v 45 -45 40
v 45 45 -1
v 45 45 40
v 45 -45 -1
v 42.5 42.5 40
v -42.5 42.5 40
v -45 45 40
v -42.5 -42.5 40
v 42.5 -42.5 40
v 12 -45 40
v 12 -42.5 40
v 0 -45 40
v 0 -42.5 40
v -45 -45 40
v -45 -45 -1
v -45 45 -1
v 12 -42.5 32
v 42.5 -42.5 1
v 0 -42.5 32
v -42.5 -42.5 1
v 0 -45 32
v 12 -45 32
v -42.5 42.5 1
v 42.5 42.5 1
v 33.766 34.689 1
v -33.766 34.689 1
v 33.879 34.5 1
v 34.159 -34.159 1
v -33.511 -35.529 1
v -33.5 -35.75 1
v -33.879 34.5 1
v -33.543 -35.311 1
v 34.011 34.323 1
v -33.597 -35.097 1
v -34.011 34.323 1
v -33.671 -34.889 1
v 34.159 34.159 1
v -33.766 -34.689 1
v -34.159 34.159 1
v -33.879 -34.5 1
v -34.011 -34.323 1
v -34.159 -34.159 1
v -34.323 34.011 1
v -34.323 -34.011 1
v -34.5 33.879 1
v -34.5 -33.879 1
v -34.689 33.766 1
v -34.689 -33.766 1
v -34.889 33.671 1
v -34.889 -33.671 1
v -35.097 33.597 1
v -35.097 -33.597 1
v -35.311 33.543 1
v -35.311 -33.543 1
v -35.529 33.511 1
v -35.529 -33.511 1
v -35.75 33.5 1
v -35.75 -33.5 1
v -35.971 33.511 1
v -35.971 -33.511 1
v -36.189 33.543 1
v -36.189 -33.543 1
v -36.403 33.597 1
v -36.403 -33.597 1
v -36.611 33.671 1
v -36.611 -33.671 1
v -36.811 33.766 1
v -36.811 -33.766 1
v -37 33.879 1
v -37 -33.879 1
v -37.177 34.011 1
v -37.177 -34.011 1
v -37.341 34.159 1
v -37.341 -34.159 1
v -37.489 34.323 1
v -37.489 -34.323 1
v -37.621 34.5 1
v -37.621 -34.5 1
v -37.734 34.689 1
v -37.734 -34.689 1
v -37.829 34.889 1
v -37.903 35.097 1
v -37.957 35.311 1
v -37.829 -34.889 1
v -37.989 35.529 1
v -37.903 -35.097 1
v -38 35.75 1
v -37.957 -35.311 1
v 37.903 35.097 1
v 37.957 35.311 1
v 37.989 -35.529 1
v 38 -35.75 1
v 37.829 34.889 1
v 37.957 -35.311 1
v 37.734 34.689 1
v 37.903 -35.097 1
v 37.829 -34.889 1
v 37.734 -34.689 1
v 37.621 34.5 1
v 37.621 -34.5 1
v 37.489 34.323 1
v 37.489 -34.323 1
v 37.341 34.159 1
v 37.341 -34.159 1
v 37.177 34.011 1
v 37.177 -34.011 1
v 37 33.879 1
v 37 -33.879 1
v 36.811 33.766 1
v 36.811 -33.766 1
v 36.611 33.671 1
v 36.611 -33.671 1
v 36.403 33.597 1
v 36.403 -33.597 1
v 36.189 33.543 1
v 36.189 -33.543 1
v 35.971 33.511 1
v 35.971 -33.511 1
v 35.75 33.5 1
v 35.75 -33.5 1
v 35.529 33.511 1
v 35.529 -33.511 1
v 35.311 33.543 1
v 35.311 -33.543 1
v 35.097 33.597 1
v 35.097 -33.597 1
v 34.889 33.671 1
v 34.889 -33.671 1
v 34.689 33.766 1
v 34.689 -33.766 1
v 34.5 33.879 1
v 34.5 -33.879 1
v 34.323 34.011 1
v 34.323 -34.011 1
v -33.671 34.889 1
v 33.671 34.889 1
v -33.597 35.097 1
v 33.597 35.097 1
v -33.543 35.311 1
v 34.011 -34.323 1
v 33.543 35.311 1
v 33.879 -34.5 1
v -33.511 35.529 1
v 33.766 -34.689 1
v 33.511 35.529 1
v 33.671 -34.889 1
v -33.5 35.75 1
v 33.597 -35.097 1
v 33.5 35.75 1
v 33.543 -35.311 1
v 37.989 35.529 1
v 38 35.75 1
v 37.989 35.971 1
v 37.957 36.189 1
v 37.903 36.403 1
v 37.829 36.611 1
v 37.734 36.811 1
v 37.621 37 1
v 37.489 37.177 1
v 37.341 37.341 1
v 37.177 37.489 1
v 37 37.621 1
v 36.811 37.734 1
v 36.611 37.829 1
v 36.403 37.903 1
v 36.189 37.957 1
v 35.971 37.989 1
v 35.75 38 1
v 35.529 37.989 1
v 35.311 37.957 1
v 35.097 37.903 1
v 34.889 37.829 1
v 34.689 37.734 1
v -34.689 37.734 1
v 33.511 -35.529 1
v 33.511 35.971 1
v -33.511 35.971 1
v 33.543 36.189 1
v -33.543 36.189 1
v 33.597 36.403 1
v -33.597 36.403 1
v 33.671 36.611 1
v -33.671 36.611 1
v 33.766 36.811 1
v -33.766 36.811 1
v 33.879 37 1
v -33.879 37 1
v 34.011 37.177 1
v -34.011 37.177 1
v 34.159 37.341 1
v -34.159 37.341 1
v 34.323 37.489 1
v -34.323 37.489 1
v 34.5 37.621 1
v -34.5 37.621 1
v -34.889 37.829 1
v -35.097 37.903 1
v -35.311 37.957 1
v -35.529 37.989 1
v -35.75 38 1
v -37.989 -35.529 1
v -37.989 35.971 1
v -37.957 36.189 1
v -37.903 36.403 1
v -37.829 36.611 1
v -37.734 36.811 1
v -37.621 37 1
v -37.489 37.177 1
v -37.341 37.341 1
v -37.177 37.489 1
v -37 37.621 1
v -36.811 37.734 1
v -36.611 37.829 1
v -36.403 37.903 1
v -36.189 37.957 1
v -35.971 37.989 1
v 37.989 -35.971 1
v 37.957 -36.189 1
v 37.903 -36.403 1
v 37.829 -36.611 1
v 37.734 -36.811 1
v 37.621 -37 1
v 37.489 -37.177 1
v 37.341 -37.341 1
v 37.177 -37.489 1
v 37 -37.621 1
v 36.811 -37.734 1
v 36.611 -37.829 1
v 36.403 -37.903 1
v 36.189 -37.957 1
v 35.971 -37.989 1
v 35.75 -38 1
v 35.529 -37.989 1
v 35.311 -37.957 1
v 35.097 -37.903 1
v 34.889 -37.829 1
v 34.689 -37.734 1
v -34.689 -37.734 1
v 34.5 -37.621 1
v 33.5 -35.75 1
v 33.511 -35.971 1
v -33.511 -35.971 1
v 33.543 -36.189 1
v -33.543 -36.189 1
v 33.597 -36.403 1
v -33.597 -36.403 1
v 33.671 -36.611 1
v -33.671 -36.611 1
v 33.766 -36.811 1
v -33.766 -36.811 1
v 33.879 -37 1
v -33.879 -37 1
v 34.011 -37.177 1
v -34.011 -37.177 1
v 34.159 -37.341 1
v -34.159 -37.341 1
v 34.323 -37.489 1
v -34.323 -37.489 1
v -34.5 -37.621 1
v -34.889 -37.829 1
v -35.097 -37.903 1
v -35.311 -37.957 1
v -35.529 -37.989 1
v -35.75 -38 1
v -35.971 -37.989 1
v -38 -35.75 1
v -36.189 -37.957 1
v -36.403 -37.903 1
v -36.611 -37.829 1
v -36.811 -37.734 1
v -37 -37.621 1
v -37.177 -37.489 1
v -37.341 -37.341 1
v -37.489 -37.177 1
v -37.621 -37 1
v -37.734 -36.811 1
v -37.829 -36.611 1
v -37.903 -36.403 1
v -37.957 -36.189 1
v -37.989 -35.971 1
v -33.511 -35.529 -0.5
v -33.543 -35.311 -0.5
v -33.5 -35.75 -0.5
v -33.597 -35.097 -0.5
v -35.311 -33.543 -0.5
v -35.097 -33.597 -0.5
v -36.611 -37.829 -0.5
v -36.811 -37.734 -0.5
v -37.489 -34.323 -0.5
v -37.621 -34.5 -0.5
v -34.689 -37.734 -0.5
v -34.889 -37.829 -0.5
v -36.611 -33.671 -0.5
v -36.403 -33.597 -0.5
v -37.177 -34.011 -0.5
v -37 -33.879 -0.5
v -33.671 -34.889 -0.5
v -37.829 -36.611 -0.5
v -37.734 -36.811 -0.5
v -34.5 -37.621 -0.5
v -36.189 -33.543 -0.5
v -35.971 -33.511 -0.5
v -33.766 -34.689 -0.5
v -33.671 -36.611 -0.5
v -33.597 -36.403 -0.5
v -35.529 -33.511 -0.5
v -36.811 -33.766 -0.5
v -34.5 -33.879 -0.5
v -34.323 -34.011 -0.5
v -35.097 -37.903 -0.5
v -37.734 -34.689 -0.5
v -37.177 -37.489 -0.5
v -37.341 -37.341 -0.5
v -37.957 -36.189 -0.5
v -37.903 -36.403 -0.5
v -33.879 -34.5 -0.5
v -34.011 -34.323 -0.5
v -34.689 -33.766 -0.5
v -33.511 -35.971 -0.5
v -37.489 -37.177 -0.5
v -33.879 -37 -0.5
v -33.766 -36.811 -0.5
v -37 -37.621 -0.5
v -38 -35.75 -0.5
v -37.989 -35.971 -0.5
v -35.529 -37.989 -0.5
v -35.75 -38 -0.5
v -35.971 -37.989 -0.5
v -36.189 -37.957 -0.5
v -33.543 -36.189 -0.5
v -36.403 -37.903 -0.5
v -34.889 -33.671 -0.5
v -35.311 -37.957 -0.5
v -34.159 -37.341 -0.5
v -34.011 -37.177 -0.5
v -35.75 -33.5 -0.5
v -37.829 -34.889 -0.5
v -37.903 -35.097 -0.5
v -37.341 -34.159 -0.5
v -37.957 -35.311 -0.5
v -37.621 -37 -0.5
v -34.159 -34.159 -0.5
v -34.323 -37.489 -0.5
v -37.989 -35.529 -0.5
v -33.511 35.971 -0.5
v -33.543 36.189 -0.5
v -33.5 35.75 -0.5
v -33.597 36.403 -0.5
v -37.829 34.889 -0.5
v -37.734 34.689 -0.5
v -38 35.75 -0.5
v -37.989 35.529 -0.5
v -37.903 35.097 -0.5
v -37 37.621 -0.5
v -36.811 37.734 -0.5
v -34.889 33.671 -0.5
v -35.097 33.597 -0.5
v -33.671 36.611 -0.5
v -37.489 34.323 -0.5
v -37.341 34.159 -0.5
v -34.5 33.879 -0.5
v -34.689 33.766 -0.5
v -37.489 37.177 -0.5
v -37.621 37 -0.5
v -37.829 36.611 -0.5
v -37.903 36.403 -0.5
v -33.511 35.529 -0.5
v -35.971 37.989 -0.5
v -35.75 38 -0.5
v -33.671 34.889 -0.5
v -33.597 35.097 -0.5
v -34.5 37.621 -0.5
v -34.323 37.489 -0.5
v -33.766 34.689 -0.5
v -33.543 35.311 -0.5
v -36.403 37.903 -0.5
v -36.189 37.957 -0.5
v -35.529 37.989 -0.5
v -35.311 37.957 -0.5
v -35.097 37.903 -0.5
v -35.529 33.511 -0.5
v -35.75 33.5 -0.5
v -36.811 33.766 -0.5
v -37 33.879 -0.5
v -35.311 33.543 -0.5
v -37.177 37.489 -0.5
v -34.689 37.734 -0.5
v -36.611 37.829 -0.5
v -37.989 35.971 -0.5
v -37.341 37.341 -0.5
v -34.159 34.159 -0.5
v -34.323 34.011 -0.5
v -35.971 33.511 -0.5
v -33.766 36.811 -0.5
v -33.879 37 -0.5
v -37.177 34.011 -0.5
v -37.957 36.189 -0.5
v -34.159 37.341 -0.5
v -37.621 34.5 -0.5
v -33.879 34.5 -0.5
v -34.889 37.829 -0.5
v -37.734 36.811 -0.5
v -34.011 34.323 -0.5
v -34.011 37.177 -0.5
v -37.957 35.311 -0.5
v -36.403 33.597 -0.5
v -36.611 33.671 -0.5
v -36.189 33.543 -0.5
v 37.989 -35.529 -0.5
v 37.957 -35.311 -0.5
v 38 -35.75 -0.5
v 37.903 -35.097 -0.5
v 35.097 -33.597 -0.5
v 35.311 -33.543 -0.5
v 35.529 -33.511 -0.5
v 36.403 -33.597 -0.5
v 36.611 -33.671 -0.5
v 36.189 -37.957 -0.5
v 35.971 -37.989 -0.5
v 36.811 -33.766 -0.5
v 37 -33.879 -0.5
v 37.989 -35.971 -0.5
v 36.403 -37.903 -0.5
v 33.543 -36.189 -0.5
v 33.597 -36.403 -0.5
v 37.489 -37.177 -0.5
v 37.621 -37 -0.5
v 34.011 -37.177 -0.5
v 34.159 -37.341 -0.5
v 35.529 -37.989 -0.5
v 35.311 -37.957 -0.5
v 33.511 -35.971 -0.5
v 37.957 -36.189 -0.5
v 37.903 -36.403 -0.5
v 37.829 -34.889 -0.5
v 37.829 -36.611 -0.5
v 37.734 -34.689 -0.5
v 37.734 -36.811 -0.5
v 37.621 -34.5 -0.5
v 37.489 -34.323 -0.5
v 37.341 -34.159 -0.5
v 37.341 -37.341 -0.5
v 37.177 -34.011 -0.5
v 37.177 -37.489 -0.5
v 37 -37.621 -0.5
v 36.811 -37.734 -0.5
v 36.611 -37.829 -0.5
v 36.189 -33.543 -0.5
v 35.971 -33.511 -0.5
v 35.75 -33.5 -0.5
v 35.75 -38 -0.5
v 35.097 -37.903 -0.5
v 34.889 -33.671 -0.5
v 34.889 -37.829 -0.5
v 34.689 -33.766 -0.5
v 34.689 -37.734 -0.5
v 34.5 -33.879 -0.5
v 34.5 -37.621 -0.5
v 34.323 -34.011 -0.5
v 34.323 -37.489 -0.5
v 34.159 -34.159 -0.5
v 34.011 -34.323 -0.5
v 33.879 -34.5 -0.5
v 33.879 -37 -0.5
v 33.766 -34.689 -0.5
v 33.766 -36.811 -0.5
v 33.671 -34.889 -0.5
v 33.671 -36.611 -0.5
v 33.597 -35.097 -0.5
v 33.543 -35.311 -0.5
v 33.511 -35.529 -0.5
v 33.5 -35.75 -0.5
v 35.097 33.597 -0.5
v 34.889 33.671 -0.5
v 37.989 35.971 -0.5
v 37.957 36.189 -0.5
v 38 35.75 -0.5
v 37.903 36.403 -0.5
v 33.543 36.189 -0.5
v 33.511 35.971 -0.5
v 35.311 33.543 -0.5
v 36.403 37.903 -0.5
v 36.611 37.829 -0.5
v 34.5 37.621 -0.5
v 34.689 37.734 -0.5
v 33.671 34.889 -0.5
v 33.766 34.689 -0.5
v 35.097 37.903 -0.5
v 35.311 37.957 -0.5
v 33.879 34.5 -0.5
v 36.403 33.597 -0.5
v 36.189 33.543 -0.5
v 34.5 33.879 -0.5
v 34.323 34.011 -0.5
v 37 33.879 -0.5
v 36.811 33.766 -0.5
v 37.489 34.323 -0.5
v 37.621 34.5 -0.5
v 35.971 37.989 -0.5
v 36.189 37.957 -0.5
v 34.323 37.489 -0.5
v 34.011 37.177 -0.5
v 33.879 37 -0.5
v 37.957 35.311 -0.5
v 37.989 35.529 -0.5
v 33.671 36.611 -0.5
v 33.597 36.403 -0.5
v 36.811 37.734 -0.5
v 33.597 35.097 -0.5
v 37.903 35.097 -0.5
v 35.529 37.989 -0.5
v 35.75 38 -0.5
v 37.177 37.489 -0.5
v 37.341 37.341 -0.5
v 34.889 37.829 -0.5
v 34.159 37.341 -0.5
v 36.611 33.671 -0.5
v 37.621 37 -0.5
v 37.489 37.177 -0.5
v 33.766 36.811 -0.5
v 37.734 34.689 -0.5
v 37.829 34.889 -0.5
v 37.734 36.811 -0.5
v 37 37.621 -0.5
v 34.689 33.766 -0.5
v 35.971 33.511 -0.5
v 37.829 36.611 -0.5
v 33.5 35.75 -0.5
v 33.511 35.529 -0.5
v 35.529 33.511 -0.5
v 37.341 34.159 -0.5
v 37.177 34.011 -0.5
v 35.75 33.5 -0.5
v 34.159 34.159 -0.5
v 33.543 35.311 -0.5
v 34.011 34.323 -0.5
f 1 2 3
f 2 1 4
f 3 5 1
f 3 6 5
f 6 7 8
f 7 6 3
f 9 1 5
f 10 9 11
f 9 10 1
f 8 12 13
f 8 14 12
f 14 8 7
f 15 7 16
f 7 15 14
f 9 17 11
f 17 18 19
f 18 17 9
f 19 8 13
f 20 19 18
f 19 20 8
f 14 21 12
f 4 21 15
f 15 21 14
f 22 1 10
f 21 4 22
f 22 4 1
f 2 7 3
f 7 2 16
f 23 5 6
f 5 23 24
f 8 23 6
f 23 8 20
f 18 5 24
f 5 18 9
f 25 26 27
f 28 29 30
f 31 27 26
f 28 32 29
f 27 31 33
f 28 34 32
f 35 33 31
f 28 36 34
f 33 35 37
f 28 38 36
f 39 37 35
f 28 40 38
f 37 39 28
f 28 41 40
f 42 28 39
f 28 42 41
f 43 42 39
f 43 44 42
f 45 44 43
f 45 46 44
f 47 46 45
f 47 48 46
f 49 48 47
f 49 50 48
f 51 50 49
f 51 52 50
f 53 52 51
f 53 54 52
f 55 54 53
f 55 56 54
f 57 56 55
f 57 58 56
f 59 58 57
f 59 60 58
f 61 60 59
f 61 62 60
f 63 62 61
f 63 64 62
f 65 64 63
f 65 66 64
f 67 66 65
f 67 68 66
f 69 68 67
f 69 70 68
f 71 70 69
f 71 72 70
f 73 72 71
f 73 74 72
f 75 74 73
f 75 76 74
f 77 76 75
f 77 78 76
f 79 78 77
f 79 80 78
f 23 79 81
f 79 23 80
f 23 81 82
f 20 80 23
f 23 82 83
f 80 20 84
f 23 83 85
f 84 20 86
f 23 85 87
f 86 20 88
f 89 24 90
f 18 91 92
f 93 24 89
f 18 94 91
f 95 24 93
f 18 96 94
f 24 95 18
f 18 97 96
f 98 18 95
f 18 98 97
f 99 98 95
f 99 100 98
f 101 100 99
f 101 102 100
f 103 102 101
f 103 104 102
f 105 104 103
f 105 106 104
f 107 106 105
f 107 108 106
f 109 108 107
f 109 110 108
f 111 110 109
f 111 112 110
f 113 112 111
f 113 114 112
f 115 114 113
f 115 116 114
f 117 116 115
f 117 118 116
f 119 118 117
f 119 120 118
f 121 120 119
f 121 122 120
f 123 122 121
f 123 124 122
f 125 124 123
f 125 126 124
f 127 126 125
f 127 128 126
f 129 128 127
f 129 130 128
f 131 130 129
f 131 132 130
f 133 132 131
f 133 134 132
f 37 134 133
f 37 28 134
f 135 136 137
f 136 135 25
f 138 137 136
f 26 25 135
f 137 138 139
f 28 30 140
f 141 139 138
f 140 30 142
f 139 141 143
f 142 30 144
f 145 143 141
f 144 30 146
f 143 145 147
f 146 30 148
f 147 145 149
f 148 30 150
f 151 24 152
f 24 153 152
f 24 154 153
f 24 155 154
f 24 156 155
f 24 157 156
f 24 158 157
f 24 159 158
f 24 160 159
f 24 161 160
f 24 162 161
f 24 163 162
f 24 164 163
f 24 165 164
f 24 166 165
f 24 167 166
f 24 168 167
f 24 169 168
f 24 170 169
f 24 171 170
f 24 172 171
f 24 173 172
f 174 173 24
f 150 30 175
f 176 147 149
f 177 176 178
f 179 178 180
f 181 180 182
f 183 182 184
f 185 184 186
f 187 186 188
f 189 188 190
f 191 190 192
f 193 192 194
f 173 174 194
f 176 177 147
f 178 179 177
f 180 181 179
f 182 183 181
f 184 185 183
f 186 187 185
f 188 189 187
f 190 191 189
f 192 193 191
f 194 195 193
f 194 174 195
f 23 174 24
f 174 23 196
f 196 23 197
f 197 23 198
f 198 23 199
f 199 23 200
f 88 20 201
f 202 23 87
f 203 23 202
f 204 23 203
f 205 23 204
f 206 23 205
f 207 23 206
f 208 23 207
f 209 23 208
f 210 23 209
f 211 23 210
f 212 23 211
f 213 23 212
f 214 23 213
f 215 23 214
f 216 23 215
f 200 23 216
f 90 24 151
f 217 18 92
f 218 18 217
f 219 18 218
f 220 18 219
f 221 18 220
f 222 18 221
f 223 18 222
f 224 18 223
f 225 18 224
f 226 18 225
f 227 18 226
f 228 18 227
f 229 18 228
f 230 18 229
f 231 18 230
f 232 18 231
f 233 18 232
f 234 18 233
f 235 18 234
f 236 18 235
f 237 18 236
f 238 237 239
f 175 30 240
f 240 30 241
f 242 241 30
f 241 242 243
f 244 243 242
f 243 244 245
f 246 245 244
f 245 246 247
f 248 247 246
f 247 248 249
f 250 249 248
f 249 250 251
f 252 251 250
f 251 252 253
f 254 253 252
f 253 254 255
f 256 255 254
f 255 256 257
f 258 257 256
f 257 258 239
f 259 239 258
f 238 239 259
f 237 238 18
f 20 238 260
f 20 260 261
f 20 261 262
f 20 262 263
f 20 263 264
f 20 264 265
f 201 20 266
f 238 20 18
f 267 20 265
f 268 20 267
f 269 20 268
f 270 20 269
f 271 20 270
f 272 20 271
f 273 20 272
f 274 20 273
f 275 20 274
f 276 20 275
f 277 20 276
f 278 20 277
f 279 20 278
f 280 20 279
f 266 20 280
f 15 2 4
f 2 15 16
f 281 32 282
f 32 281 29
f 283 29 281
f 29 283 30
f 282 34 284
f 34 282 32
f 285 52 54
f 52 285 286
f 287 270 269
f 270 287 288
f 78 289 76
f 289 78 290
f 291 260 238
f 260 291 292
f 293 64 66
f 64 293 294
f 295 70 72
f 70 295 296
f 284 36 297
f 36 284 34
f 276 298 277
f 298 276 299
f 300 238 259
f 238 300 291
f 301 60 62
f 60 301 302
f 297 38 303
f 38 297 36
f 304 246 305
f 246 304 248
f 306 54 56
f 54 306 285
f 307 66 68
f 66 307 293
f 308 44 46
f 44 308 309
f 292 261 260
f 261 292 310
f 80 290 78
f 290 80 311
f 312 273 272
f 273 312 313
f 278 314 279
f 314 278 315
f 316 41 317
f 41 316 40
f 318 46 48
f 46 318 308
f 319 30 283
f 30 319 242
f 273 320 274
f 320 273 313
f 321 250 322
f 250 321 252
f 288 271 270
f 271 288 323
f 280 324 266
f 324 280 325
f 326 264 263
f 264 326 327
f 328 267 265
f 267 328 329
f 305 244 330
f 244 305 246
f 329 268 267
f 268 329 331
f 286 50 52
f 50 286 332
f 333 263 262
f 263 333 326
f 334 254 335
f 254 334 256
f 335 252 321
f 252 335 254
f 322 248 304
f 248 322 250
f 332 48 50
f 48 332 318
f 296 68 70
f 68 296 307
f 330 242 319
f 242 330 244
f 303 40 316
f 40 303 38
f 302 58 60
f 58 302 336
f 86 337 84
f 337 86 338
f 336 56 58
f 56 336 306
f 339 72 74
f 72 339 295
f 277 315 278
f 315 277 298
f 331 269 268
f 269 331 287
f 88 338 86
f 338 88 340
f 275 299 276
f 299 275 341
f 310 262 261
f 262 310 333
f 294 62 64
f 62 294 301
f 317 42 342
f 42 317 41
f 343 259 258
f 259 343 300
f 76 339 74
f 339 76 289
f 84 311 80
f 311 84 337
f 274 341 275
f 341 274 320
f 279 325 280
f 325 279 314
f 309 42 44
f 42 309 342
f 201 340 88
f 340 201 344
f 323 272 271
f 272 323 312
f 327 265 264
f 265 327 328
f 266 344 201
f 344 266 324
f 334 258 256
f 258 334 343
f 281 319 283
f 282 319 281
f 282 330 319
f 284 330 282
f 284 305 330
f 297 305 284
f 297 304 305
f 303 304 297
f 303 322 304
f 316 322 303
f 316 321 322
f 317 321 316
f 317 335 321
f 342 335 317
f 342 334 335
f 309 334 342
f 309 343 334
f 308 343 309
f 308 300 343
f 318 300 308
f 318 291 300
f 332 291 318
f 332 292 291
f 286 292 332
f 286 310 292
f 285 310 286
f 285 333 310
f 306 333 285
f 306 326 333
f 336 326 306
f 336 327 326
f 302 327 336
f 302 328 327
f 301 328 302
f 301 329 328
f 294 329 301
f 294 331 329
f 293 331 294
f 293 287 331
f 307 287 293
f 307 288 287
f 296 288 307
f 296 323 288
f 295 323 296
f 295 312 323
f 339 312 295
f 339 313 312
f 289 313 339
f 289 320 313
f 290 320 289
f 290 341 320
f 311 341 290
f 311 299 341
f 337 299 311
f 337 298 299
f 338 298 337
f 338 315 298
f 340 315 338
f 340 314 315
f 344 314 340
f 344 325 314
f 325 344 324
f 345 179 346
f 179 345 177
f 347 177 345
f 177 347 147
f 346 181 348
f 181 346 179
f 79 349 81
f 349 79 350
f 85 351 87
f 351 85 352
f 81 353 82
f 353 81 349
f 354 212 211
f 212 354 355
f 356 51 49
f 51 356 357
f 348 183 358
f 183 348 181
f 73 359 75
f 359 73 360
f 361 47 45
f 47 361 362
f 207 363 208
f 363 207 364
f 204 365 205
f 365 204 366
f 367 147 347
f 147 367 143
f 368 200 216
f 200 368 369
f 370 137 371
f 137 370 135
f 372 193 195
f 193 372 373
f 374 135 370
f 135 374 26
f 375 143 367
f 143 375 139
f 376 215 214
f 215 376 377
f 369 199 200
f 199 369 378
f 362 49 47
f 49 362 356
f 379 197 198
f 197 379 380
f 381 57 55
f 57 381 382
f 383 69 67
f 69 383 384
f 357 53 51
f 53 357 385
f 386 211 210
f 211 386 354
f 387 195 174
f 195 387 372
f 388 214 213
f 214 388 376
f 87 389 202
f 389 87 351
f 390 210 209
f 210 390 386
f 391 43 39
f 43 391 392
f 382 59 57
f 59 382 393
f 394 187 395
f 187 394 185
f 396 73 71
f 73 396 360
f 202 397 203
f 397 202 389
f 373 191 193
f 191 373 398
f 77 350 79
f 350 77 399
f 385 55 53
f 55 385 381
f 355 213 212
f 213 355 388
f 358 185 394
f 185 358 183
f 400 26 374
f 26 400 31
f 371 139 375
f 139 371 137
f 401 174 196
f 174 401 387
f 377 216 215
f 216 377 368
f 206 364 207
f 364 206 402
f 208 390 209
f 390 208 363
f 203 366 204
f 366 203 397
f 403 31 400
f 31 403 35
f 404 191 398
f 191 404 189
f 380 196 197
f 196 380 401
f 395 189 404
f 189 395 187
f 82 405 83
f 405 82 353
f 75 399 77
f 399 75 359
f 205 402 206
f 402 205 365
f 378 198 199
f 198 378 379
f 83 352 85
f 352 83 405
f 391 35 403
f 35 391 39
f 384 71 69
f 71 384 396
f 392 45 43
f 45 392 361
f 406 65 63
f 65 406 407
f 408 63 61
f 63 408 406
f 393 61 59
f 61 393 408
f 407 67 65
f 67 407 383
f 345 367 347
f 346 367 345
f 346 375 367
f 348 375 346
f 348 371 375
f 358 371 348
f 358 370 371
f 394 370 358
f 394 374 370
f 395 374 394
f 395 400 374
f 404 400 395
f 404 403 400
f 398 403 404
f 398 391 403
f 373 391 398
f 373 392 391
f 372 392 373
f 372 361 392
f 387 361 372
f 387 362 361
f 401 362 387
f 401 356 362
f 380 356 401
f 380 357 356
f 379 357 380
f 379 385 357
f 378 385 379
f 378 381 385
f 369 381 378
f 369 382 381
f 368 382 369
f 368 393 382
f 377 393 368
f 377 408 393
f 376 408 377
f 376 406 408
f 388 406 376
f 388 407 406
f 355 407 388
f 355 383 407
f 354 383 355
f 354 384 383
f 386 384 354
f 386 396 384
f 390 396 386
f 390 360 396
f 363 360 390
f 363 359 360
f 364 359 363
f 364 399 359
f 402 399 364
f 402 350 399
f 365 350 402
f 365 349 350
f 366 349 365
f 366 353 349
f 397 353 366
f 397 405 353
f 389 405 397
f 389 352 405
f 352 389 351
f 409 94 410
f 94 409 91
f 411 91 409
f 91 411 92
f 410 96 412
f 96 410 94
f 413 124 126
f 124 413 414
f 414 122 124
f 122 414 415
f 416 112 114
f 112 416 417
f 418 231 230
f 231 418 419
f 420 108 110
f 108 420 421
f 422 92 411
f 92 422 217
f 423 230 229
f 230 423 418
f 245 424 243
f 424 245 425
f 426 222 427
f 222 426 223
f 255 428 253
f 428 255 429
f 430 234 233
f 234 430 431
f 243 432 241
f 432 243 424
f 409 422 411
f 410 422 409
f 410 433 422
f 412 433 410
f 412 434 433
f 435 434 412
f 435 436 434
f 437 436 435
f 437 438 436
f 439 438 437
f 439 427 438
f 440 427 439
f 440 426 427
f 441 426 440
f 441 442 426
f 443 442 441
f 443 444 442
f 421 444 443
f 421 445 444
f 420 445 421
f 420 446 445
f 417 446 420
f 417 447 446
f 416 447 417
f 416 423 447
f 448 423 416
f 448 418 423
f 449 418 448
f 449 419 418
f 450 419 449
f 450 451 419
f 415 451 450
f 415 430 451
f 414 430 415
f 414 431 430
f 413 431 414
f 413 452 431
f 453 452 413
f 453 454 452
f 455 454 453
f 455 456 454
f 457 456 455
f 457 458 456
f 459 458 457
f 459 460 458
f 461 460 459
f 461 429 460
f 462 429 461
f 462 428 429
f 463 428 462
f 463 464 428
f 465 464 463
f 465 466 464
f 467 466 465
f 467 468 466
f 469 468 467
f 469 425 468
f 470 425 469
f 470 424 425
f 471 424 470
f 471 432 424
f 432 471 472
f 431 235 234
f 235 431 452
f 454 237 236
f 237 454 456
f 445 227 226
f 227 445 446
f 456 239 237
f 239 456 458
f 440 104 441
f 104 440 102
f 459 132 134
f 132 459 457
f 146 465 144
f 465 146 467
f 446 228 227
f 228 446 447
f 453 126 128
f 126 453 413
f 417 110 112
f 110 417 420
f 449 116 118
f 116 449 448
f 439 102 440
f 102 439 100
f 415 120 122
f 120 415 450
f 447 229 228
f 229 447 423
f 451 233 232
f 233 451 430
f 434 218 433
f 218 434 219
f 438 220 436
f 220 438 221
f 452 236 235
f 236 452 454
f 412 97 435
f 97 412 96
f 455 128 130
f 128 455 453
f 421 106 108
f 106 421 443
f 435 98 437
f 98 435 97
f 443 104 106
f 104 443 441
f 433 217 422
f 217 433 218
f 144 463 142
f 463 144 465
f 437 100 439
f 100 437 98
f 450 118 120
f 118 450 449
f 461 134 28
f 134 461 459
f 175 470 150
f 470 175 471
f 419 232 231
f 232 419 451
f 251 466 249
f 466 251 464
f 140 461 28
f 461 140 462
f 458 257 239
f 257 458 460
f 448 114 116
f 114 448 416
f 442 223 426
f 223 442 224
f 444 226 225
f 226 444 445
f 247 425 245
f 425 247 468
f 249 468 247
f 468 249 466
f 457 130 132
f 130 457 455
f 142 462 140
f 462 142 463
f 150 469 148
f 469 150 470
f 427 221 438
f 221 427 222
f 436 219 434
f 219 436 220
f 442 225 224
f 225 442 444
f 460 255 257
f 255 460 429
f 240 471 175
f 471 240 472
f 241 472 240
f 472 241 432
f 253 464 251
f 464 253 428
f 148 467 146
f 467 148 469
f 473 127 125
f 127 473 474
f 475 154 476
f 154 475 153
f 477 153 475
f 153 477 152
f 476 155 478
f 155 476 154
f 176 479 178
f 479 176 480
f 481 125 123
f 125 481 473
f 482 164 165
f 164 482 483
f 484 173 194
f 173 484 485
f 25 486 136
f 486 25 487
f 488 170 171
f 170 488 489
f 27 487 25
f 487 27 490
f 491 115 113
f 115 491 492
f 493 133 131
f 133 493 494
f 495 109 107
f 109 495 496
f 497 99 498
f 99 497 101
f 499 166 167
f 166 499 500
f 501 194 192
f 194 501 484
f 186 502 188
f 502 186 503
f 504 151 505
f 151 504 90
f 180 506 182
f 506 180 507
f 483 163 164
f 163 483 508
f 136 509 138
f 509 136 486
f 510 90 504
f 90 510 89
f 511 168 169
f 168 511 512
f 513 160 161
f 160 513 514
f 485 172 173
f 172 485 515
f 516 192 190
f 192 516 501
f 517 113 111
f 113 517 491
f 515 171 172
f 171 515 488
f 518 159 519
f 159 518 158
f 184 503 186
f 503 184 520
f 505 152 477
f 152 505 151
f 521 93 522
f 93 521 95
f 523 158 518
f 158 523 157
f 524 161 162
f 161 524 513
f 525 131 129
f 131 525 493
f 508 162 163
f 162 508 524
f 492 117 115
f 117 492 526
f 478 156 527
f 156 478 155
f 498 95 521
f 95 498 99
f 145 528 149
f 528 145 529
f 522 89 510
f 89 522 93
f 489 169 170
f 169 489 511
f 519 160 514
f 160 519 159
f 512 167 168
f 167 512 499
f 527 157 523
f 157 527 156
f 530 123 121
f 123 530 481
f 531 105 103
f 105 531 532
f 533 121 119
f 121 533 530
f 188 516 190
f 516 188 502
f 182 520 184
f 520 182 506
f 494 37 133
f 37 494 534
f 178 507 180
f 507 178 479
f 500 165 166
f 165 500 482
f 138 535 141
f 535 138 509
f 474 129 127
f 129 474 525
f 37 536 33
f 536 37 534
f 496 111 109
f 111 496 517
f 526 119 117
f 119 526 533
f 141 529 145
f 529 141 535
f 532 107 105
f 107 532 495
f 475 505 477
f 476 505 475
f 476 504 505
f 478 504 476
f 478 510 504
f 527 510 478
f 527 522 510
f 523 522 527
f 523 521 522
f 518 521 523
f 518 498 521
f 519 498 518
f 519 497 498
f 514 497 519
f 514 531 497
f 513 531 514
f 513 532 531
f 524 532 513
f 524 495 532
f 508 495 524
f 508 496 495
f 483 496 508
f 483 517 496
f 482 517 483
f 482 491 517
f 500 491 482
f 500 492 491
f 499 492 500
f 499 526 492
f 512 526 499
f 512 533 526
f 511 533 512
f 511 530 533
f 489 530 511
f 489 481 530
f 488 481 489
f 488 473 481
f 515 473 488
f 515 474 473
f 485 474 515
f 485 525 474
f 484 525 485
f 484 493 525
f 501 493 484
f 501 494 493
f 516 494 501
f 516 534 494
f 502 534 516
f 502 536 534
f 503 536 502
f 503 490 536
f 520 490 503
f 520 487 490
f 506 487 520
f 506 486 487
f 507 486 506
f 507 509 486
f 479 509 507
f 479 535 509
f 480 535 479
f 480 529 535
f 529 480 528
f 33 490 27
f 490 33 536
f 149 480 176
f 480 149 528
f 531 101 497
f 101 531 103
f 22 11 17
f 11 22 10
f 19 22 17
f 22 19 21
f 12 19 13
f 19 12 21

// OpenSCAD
// Housing for a DIY magnetic stirrer built from an 80 mm PC case fan.
// Modelled in print orientation (upside down): the 2 mm top plate lies on the bed
// (z = 0 to 2) and four 2.5 mm walls rise from it to z = 40, where the box is open.

$fn = 64;

// ---- Dimensions (mm) ----
outer_x   = 90;   // outer size in X
outer_y   = 90;   // outer size in Y
wall_t    = 2.5;  // wall thickness
top_t     = 2;    // top plate thickness (lies on the bed in print orientation)
wall_h    = 40;   // total height of the walls (z = 0 to 40)

hole_d    = 4.5;  // M4 clearance hole diameter in the top plate
hole_pitch= 71.5; // square pitch of the four mounting holes, centred on the plate

notch_w   = 12;   // width of the power-cable notch
notch_top = 40;   // top of the notch (open edge of the box)
notch_bot = 32;   // bottom of the notch (8 mm down from the open edge)

// ---- Base: 2 mm top plate on the bed ----
module top_plate() { translate([0, 0, 0])
    cube([outer_x, outer_y, top_t], center = true); }

// ---- Four walls rising from the plate to z = 40 ----
module walls() { union() {
    // Front wall (negative Y side)
    translate([-outer_x/2, -outer_y/2, 0])
        cube([outer_x, wall_t, wall_h]);

    // Back wall (positive Y side)
    translate([-outer_x/2, outer_y/2 - wall_t, 0])
        cube([outer_x, wall_t, wall_h]);

    // Left wall (negative X side)
    translate([-outer_x/2, -outer_y/2 + wall_t, 0])
        cube([wall_t, outer_y - 2*wall_t, wall_h]);

    // Right wall (positive X side)
    translate([outer_x/2 - wall_t, -outer_y/2 + wall_t, 0])
        cube([wall_t, outer_y - 2*wall_t, wall_h]);
} }

// ---- Four M4 clearance holes through the top plate ----
// 71.5 mm square pattern centred on the plate; each hole is 4.5 mm in diameter.
// The cylinders extend 0.5 mm past each face of the 2 mm plate so no faces are coplanar.
module holes() { for (sx = [-1, 1], sy = [-1, 1])
    translate([sx * hole_pitch/2, sy * hole_pitch/2, -0.5])
        cylinder(h = top_t + 1.0, d = hole_d, $fn = 64); }

// ---- Power-cable notch in one wall (front wall, negative Y side) ----
// 12 mm wide, centred along the wall, from z = 32 to z = 40.
// The cutter extends 0.5 mm past the outer face and 1 mm past the open top edge.
module notch_cutter() { translate([0, -outer_y/2 - 0.5, notch_bot])
    cube([notch_w, wall_t + 1.0, notch_top - notch_bot + 1.0]); }

// ---- Final solid ----
difference() {
    union() {
        top_plate();
        walls();
    }
    holes();
    notch_cutter();
}
